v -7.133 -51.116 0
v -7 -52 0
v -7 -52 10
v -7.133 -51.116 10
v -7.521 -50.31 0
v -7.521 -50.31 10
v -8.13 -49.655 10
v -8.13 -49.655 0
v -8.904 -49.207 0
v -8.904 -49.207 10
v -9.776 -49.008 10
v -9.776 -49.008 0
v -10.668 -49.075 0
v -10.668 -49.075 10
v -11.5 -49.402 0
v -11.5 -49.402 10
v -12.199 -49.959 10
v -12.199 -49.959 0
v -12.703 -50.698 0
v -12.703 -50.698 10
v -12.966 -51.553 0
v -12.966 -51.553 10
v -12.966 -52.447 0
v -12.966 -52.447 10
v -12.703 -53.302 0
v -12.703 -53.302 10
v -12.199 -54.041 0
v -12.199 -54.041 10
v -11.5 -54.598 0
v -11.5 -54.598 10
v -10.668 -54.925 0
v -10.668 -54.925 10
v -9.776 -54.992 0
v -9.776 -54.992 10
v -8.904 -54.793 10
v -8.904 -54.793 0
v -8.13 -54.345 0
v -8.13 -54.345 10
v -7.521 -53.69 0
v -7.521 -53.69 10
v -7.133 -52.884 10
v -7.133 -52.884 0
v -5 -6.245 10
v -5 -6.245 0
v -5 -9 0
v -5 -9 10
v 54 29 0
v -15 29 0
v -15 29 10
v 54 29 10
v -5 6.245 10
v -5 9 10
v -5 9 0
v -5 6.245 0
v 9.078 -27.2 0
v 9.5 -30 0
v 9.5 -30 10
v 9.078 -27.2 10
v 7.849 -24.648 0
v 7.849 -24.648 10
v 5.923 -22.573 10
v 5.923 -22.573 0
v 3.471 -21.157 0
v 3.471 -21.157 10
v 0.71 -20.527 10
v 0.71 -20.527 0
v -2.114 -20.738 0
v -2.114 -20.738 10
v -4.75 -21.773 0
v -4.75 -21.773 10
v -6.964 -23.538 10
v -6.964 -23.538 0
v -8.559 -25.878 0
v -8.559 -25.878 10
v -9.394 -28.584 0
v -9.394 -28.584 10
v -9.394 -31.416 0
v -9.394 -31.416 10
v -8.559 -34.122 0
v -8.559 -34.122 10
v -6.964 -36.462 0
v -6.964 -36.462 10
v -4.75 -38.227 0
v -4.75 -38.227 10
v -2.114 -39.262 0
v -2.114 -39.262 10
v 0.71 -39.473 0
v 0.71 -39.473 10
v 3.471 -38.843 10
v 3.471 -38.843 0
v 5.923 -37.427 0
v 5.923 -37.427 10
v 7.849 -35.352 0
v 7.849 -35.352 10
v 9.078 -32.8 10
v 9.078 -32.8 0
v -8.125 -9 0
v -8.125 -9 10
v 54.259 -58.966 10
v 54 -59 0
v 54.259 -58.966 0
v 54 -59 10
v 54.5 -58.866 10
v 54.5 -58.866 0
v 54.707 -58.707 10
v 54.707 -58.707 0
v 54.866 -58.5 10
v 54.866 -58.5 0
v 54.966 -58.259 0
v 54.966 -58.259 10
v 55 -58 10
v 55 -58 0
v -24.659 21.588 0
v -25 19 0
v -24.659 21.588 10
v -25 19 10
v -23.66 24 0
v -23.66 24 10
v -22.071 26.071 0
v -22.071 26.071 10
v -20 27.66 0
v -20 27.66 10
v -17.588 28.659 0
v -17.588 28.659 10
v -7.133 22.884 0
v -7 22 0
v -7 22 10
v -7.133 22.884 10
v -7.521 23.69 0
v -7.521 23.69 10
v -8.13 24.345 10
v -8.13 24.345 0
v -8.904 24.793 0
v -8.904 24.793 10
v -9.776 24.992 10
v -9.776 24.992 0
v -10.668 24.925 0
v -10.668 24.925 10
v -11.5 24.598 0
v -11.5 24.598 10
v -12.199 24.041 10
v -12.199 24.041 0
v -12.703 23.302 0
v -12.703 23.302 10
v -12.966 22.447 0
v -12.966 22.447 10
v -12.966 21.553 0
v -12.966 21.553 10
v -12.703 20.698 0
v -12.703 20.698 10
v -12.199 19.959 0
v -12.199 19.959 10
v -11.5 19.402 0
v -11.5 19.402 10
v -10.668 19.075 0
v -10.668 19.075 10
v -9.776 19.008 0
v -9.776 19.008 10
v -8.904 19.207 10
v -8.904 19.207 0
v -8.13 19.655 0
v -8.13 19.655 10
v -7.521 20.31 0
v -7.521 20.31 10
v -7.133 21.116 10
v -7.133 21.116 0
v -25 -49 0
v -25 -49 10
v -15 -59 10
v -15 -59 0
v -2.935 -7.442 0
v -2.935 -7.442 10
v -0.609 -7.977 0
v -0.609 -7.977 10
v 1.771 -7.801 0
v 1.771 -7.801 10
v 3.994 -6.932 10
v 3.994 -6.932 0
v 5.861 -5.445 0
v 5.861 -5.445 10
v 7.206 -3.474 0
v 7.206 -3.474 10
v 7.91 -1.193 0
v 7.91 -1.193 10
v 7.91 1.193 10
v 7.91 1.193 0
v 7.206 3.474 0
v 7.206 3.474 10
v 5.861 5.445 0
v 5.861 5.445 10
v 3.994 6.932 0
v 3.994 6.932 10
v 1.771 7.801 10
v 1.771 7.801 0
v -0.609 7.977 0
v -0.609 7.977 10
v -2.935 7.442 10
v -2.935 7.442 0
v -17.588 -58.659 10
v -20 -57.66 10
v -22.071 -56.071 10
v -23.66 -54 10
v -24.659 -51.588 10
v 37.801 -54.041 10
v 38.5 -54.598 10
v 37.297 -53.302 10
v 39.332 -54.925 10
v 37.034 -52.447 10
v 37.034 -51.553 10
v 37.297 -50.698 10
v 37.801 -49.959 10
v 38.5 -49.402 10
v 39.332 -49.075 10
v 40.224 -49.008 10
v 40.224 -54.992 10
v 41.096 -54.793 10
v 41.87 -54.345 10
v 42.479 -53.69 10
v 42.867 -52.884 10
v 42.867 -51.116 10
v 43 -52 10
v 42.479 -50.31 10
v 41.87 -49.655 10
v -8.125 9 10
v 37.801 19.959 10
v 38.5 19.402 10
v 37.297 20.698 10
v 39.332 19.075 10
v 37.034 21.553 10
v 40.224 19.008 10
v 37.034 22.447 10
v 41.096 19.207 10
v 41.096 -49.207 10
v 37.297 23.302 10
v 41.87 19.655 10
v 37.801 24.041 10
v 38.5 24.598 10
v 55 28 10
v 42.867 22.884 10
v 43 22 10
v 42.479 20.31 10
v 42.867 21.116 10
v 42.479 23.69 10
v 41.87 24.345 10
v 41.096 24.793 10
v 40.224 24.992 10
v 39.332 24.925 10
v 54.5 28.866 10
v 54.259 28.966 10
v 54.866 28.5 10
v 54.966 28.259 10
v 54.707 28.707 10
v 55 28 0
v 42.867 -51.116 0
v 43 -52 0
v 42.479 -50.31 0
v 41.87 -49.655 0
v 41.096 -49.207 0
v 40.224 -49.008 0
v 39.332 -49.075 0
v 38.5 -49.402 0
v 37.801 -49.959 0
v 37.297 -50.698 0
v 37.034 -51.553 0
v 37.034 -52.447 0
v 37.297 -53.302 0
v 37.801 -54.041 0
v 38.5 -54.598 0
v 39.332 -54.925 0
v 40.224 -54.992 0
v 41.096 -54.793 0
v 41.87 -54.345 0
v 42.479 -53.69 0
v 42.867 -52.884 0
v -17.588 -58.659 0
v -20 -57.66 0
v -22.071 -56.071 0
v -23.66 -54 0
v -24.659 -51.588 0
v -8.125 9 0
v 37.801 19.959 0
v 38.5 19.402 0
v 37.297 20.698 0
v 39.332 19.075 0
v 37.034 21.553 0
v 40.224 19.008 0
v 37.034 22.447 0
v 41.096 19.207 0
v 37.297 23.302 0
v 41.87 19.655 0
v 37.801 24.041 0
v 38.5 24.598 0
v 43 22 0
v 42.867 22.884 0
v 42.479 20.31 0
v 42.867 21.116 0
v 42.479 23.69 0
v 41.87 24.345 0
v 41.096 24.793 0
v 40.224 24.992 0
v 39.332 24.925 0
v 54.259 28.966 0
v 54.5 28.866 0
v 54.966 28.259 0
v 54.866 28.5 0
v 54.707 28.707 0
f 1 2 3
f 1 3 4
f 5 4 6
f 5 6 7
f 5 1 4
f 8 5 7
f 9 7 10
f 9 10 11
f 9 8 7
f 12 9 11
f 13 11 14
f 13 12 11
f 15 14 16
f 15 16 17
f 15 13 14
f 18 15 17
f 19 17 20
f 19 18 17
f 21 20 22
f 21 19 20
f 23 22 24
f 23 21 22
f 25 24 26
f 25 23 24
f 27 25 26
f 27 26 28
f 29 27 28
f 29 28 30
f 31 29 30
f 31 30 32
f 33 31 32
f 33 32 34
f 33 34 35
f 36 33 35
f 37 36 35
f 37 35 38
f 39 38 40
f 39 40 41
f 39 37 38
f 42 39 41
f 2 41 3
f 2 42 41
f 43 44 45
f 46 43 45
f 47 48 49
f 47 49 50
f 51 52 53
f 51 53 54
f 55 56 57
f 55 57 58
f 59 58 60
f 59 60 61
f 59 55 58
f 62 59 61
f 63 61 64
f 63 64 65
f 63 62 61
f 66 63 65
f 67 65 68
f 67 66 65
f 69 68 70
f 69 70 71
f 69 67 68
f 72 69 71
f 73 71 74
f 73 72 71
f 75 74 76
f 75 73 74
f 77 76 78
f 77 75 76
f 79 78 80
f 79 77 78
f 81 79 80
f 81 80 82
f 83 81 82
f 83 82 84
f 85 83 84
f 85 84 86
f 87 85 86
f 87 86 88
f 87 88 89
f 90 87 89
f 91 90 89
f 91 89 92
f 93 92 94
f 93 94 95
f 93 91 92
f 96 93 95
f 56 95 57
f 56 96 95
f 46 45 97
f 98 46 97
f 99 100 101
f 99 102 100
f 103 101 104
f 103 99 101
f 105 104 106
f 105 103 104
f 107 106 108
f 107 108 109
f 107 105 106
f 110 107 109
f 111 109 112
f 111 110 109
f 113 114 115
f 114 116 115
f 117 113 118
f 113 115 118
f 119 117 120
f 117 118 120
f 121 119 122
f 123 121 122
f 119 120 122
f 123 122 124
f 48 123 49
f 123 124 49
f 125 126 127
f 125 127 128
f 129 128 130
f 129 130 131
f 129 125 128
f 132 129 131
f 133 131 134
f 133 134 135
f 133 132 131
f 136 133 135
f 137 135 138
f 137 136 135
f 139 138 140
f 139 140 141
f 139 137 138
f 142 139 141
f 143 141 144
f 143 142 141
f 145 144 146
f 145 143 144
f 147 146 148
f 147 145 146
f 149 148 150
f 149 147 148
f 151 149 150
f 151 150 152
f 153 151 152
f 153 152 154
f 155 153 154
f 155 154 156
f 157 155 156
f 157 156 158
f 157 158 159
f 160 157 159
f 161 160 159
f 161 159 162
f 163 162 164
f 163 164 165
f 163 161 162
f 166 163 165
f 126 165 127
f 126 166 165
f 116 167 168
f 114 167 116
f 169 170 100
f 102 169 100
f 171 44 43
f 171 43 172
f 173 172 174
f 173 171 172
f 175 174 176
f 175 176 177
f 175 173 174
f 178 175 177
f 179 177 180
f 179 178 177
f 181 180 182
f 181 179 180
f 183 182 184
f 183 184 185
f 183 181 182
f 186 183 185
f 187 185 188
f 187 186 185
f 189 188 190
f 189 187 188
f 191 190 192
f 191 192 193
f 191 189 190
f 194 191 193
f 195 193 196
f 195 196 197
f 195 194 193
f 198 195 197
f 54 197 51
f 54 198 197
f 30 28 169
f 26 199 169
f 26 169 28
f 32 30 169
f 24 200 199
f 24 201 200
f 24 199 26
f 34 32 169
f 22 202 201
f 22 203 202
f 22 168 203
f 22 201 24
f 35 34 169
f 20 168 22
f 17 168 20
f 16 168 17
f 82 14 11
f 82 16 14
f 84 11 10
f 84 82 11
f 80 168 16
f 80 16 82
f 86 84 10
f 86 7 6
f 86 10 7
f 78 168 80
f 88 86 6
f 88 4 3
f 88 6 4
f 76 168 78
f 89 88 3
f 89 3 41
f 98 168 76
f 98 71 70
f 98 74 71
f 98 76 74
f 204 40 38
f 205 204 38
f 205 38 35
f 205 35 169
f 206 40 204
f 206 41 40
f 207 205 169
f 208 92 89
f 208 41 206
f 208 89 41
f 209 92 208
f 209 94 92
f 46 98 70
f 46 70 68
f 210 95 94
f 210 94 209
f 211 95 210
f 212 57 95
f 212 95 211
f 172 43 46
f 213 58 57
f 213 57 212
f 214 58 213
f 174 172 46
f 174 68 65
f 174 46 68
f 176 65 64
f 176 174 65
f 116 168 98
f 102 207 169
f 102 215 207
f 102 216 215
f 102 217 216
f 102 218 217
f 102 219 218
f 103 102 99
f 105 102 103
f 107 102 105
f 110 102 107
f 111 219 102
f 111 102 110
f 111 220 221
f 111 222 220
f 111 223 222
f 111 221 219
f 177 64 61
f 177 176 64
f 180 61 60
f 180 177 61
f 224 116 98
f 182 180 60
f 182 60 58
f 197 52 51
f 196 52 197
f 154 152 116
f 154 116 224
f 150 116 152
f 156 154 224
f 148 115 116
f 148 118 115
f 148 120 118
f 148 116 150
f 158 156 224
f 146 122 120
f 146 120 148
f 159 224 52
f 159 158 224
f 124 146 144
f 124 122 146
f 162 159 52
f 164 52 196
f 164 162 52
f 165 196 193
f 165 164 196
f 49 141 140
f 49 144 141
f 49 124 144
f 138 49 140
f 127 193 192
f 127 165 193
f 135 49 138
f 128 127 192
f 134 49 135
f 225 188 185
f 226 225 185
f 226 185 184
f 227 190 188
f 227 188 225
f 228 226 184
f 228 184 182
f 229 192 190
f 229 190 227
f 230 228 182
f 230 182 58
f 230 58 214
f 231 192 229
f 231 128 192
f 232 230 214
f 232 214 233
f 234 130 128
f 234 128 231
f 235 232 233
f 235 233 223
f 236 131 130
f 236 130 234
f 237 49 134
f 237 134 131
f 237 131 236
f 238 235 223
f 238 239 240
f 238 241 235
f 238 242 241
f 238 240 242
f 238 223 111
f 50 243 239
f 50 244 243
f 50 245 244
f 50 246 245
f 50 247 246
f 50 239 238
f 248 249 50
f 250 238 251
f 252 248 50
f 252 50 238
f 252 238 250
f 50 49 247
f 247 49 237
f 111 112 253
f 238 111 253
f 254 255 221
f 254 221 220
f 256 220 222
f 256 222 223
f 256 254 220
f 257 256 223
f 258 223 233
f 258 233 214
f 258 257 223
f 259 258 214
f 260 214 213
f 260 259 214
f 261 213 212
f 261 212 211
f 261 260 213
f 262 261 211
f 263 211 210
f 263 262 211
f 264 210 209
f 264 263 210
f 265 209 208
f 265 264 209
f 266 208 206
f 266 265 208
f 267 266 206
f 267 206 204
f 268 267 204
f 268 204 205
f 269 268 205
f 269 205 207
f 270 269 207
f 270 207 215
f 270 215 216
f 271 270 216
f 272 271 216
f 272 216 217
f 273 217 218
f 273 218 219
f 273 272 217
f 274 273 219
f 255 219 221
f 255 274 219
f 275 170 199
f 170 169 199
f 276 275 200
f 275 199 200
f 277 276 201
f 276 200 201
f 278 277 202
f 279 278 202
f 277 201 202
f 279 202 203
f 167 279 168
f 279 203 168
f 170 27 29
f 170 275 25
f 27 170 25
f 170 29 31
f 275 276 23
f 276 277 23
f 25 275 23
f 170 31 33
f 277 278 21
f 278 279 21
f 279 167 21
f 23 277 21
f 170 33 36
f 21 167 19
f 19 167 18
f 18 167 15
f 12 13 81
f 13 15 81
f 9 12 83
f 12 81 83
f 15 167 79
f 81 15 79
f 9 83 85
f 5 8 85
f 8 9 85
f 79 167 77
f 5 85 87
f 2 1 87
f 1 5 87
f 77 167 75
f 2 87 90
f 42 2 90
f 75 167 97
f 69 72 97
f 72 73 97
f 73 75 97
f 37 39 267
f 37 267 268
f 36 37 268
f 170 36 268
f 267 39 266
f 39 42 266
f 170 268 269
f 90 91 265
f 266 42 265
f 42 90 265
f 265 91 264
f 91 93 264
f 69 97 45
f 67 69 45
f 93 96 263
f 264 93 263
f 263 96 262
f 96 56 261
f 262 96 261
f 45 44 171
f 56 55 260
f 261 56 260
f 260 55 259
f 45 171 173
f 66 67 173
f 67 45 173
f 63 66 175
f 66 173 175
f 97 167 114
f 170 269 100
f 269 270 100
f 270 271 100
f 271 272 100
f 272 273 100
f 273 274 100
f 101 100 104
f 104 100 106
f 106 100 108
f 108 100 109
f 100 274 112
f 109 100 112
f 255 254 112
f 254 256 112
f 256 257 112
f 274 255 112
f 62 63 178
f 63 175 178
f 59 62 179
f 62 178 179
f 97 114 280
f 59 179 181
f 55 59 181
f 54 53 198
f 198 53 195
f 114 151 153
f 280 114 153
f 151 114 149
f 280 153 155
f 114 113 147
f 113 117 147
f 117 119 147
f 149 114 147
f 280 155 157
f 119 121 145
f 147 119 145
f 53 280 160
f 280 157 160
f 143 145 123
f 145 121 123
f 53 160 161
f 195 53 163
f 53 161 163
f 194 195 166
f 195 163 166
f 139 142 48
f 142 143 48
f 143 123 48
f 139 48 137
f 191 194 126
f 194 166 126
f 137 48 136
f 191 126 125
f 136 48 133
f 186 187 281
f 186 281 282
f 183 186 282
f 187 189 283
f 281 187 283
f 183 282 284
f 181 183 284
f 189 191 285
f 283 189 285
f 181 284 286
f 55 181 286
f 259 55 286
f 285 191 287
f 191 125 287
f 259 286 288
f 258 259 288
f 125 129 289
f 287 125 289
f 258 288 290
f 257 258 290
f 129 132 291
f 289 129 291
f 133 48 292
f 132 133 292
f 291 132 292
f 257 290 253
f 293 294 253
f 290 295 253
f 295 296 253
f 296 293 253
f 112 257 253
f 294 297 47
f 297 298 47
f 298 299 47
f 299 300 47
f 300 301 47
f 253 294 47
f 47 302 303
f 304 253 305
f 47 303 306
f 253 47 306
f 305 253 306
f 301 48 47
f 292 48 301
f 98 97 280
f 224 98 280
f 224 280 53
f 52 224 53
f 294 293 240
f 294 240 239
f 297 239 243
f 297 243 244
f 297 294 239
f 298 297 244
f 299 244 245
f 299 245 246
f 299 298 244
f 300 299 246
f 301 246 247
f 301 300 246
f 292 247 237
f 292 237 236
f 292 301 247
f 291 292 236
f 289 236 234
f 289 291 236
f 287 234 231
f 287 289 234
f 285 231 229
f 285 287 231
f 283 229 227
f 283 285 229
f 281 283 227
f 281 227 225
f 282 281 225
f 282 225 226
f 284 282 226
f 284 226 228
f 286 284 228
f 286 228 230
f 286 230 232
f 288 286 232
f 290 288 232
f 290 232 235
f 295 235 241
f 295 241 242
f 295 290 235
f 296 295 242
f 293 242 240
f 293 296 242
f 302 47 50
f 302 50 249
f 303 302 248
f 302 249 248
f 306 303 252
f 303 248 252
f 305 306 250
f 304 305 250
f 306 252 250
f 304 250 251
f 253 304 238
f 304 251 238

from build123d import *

# Parameters (mm, degrees)
SKETCH_W    = 80
SKETCH_H    = 88
SKETCH_R    = 9.5
SKETCH_R_2  = 3
PAD_DEPTH   = 10
FILLET_R    = 1
FILLET001_R = 10


with BuildPart() as part:
    # Sketch → Pad (new body)
    with BuildSketch(Plane.XY):
        with Locations((15, -15)):
            Rectangle(SKETCH_W, SKETCH_H)
        with Locations((0, -30)):
            Circle(SKETCH_R, mode=Mode.SUBTRACT)
        with Locations((-10, -52)):
            Circle(SKETCH_R_2, mode=Mode.SUBTRACT)
        with Locations((40, -52)):
            Circle(SKETCH_R_2, mode=Mode.SUBTRACT)
        with Locations((40, 22)):
            Circle(SKETCH_R_2, mode=Mode.SUBTRACT)
        with Locations((-10, 22)):
            Circle(SKETCH_R_2, mode=Mode.SUBTRACT)
        with BuildLine():
            ThreePointArc((-5, -6.244998), (8, 0), (-5, 6.244998))
            Line((-5, 9), (-5, 6.244998))
            Line((-8.125, 9), (-5, 9))
            Line((-8.125, -9), (-8.125, 9))
            Line((-5, -9), (-8.125, -9))
            Line((-5, -6.244998), (-5, -9))
        make_face(mode=Mode.SUBTRACT)
    extrude(amount=PAD_DEPTH)

    # Fillet
    fillet_edges = [part.edges().sort_by_distance(p)[0] for p in [
        (55, -59, 5),
        (55, 29, 5),
    ]]
    fillet(fillet_edges, radius=FILLET_R)

    # Fillet001
    fillet001_edges = [part.edges().sort_by_distance(p)[0] for p in [
        (-25, -59, 5),
        (-25, 29, 5),
    ]]
    fillet(fillet001_edges, radius=FILLET001_R)


solid = part.part
